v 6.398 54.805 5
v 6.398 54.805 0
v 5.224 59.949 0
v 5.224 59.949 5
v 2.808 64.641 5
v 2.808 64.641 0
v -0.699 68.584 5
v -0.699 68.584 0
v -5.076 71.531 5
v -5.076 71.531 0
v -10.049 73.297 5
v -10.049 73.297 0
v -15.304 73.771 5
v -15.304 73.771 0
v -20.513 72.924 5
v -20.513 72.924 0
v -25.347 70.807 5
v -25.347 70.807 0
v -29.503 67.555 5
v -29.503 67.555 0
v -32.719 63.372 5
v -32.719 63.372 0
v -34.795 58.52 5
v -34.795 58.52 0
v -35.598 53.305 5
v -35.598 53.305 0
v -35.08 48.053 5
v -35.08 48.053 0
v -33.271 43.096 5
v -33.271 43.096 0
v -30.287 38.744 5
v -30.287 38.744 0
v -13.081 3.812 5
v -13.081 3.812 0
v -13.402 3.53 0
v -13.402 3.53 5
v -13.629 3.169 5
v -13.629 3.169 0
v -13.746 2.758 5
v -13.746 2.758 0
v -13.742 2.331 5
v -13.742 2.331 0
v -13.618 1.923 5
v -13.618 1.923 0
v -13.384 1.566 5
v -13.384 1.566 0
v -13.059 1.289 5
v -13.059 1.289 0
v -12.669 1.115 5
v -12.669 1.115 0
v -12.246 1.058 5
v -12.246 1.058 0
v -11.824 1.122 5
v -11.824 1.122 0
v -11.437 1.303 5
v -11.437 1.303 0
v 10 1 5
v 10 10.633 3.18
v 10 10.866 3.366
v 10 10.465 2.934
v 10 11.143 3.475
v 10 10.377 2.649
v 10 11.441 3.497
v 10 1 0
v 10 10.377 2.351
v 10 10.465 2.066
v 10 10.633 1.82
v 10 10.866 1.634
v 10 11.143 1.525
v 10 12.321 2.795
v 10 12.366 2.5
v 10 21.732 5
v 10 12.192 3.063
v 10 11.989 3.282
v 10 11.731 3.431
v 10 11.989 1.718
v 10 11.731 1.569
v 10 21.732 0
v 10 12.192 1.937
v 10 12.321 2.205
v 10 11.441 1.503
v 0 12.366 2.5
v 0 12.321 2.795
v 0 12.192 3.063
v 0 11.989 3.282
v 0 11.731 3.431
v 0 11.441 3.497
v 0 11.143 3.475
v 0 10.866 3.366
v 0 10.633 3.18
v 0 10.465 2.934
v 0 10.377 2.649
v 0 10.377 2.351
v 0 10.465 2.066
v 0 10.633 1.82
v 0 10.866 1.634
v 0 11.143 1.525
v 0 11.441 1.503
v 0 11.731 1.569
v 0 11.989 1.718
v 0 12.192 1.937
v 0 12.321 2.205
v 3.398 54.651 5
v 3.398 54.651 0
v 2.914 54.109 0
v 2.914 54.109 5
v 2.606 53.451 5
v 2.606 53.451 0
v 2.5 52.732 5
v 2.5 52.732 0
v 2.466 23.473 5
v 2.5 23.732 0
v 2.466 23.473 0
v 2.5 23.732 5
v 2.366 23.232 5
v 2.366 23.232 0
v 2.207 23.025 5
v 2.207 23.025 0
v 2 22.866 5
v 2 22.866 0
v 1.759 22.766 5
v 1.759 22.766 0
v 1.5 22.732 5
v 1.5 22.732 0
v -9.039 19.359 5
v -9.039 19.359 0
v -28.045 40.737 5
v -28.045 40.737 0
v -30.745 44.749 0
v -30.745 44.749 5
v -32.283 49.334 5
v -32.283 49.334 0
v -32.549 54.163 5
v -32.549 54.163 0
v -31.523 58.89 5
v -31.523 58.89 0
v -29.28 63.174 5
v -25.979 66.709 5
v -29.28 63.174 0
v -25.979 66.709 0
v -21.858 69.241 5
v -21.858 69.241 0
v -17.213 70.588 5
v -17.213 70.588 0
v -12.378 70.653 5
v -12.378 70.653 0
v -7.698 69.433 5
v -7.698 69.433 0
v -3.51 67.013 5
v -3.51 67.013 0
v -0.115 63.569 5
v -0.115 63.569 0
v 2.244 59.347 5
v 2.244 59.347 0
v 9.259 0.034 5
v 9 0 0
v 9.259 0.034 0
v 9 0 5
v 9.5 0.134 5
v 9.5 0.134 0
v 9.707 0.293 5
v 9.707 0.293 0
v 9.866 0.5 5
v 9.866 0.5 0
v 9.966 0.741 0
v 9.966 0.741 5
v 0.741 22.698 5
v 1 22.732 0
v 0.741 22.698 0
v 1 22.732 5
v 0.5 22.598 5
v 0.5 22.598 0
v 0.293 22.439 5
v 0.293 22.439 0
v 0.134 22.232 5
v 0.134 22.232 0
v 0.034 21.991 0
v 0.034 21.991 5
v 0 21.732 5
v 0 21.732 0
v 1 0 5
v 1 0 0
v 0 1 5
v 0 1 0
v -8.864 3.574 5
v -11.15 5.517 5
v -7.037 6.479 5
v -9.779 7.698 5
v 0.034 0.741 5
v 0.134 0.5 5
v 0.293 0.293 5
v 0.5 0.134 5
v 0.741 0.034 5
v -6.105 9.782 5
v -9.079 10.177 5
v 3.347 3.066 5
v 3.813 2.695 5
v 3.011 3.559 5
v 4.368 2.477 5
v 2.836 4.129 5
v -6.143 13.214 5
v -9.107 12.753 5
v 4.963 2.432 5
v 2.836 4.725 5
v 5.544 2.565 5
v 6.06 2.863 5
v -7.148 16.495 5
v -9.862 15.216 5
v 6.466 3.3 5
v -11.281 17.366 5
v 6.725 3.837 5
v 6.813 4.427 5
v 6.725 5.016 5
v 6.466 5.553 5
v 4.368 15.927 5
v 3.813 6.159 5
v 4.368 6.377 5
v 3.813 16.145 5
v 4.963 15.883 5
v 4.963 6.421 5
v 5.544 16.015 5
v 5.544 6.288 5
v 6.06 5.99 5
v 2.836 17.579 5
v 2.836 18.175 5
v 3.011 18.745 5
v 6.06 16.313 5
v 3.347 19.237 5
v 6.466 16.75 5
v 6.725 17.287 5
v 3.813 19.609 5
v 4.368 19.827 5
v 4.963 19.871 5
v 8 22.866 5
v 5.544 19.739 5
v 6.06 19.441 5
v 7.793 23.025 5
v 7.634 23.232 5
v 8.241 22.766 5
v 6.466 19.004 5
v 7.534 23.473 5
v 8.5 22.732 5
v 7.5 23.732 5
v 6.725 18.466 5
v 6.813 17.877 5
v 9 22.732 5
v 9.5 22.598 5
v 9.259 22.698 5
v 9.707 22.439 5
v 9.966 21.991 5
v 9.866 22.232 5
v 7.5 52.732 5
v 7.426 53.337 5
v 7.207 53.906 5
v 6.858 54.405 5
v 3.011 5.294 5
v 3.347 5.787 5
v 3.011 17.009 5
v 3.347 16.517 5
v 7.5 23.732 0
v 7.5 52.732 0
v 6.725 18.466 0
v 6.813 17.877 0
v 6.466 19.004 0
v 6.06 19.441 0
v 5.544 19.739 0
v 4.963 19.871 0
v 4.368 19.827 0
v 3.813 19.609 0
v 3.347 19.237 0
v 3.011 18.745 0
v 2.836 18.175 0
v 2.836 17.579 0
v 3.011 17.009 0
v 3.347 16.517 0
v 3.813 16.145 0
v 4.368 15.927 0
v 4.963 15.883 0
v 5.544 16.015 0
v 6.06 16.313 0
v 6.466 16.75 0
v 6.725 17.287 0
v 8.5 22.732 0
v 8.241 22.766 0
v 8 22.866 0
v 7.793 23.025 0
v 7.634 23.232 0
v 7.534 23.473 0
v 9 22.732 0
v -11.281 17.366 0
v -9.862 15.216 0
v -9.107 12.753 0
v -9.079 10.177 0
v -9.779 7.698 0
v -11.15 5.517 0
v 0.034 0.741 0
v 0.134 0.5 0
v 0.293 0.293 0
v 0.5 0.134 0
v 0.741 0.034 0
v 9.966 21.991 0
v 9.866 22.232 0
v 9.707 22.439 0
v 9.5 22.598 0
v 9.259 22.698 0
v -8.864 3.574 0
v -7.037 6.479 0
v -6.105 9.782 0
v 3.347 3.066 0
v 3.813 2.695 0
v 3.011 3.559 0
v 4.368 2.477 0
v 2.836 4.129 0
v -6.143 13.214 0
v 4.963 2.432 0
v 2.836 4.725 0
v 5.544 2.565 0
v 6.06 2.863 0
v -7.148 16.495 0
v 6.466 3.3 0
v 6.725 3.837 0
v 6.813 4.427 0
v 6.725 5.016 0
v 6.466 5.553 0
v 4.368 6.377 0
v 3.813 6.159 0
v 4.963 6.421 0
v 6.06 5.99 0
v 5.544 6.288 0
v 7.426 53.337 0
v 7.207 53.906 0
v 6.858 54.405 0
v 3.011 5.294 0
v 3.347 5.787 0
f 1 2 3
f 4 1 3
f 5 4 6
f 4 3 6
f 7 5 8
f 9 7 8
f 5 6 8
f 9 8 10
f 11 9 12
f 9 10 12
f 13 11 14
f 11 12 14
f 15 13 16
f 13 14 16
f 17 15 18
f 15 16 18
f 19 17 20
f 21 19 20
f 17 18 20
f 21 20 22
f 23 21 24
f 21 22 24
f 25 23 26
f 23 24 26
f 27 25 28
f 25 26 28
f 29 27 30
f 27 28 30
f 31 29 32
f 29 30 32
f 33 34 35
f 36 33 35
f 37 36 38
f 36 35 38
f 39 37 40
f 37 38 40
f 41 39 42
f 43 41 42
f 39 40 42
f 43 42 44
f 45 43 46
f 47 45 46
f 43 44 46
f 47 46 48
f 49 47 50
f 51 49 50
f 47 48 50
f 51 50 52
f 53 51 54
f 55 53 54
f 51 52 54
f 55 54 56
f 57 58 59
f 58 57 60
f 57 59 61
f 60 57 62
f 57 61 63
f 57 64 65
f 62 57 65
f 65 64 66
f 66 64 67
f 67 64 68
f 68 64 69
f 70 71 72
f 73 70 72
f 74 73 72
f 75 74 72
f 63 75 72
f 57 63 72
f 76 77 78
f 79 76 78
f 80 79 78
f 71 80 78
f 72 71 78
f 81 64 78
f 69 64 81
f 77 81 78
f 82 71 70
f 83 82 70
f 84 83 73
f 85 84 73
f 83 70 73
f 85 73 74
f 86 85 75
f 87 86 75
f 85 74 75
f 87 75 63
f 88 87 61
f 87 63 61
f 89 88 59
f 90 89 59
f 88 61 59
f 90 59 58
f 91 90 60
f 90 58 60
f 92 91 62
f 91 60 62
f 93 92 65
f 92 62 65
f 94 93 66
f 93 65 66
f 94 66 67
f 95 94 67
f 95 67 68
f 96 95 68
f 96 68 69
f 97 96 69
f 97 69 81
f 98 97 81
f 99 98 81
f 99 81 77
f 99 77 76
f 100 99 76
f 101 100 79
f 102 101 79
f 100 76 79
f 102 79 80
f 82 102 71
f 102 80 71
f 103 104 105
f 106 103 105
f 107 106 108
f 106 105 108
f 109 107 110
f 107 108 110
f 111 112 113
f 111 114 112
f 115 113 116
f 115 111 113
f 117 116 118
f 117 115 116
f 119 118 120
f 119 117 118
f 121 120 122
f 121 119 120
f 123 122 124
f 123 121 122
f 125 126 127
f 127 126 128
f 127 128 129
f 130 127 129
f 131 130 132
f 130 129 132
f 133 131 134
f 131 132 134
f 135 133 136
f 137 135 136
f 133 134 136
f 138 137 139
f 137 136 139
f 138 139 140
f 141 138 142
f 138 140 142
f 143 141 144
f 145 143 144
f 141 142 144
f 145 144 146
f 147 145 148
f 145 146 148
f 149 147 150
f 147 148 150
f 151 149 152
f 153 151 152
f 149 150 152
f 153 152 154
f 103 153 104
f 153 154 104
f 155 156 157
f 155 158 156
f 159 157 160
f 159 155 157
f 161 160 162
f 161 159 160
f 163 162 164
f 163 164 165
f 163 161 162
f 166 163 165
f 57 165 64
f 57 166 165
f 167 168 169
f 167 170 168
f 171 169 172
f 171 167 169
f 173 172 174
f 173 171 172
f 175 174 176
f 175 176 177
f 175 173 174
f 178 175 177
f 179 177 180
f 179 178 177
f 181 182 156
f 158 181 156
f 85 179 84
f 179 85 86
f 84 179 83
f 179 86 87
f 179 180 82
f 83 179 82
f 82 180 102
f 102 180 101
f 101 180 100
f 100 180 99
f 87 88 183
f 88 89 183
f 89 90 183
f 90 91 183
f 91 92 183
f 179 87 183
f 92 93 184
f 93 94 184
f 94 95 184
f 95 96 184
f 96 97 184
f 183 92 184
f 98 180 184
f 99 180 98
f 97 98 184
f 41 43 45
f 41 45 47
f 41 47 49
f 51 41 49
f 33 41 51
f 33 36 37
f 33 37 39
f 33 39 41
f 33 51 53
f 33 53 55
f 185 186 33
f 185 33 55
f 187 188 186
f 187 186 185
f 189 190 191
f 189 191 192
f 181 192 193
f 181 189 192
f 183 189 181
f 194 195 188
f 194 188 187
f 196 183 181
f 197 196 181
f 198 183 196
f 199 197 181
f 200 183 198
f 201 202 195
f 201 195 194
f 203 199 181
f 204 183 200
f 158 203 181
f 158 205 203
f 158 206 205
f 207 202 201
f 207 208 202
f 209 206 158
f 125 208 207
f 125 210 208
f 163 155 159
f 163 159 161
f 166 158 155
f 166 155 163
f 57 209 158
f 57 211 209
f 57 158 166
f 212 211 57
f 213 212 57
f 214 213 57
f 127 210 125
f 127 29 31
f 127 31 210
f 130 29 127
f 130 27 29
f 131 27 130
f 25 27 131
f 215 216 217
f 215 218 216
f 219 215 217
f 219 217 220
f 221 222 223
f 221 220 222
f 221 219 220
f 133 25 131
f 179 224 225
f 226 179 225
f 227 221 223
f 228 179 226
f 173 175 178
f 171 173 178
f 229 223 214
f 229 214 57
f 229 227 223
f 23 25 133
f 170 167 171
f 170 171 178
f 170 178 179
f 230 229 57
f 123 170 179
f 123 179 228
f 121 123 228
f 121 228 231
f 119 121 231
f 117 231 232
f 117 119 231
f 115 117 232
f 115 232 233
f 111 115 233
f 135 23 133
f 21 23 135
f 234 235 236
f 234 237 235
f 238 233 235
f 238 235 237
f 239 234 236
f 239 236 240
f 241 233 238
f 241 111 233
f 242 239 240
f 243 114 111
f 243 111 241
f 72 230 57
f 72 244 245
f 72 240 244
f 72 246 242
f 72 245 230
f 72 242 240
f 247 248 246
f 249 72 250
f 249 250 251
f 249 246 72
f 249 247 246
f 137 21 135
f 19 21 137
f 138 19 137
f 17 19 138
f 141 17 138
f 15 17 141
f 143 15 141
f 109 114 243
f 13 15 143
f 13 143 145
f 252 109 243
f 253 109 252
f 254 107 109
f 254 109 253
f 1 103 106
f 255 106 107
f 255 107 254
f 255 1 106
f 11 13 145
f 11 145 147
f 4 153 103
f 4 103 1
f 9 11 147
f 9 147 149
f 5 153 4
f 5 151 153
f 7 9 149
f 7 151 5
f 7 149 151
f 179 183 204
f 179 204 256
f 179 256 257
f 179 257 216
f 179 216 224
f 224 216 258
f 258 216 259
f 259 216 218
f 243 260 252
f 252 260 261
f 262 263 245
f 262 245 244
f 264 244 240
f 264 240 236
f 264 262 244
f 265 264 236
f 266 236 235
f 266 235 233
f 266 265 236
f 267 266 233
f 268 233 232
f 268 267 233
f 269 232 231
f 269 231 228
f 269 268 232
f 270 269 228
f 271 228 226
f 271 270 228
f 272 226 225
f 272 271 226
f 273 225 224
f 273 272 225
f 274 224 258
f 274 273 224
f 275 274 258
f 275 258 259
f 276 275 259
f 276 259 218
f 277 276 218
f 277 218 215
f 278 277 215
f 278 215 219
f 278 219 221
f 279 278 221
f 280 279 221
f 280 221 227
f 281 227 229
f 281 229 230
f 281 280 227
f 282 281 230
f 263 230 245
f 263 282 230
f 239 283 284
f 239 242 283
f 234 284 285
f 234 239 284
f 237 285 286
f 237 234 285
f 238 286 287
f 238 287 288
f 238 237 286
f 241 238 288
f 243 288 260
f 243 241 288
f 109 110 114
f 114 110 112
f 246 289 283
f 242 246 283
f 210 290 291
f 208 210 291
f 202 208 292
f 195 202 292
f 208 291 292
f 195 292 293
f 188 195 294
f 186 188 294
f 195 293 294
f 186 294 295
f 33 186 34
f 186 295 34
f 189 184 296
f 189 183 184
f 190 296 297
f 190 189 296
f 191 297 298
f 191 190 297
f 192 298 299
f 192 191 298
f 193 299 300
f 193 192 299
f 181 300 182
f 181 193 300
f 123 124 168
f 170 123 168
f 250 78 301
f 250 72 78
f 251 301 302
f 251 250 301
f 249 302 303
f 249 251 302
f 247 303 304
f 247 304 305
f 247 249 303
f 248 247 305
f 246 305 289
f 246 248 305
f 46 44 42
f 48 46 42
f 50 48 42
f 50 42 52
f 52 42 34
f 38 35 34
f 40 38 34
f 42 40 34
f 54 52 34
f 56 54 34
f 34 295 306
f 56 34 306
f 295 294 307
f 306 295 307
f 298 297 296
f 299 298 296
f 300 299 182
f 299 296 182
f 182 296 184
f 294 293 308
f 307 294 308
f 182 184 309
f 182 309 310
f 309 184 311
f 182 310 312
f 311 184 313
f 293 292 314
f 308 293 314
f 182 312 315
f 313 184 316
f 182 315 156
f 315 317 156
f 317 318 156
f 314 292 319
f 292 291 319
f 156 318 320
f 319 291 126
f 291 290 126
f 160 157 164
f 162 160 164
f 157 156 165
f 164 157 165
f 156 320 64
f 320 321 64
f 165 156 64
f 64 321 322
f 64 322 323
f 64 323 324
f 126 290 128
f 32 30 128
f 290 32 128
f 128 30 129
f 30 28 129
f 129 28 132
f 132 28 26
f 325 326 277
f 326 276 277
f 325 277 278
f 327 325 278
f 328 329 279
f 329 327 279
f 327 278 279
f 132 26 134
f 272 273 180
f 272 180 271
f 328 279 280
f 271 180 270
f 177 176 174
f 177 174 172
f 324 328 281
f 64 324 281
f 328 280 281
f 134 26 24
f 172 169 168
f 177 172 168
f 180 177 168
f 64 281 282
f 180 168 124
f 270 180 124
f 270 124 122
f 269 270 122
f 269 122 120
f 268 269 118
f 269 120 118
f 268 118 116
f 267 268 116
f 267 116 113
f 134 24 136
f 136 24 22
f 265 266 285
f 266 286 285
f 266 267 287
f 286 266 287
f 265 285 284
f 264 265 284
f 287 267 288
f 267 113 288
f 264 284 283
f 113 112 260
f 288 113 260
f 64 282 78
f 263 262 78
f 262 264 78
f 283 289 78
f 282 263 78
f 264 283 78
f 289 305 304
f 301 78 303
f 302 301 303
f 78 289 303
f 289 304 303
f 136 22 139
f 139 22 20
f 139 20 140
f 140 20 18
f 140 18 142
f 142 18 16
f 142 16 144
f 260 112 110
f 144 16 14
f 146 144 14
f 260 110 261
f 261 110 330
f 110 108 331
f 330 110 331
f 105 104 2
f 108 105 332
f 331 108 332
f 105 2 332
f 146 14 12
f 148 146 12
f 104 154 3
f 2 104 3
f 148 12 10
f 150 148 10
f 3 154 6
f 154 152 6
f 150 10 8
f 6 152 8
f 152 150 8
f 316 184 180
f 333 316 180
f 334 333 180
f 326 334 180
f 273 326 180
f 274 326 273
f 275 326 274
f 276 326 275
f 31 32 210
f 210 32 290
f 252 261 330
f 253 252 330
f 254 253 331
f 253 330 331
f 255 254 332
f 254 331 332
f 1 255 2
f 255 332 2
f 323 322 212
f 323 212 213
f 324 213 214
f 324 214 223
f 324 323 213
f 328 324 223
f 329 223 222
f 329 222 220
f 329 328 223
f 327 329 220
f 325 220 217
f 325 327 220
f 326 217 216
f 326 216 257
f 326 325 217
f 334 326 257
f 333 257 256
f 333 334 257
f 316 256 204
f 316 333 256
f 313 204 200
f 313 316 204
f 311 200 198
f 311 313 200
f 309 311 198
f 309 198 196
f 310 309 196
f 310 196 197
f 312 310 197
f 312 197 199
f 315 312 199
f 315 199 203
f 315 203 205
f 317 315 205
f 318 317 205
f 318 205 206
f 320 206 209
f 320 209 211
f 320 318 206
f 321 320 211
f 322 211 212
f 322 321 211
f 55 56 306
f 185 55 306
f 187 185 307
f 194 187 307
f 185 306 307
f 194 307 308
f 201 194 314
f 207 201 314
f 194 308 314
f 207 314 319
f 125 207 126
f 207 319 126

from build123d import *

# Parameters (mm, degrees)
F0_R     = 2
F1_DEPTH = 5
F2_R     = 1
F3_R     = 1
F4_DEPTH = 10


with BuildPart() as f1:
    # F0 (on Top) → F1 (new body)
    with BuildSketch(Plane.XY):
        Polygon((0, 22.7317288518), (0, 0), (10, 0), (10, 22.7317288518), (7.5, 22.7317288518), (5, 22.7317288518), (2.5, 22.7317288518), align=None)
        with Locations((4.8133912496, 4.4267121702)):
            Circle(F0_R, mode=Mode.SUBTRACT)
        with Locations((4.8133912496, 17.8769808263)):
            Circle(F0_R, mode=Mode.SUBTRACT)
        with BuildLine():
            Line((2.5, 52.7317288518), (2.5, 22.7317288518))
            Line((2.5, 22.7317288518), (5, 22.7317288518))
            Line((5, 22.7317288518), (5, 51.2317288518))
            ThreePointArc((5, 51.2317288518), (3.9393398282, 51.67106868), (3.5, 52.7317288518))
            ThreePointArc((3.5, 52.7317288518), (3.4744103207, 53.6926062484), (3.3977138284, 54.6507596031))
            ThreePointArc((3.3977138284, 54.6507596031), (2.7355226399, 53.7910410275), (2.5, 52.7317288518))
        make_face()
        with BuildLine():
            Line((5, 22.7317288518), (7.5, 22.7317288518))
            Line((7.5, 22.7317288518), (7.5, 52.7317288518))
            ThreePointArc((7.5, 52.7317288518), (7.2072929768, 53.9055506928), (6.3977138284, 54.8045038164))
            ThreePointArc((6.3977138284, 54.8045038164), (6.4744129083, 53.7693774574), (6.5, 52.7317288518))
            ThreePointArc((6.5, 52.7317288518), (6.0606601718, 51.67106868), (5, 51.2317288518))
            Line((5, 51.2317288518), (5, 22.7317288518))
        make_face()
        with BuildLine():
            ThreePointArc((3.5, 52.7317288518), (3.9393398282, 51.67106868), (5, 51.2317288518))
            Line((5, 51.2317288518), (5, 52.7317288518))
            ThreePointArc((5, 52.7317288518), (4.960003557, 53.9817288518), (4.8401778569, 55.226614998))
            ThreePointArc((4.8401778569, 55.226614998), (4.073091813, 55.053547366), (3.3977138284, 54.6507596031))
            ThreePointArc((3.3977138284, 54.6507596031), (3.4744103207, 53.6926062484), (3.5, 52.7317288518))
        make_face()
        with BuildLine():
            Line((5, 52.7317288518), (5, 51.2317288518))
            ThreePointArc((5, 51.2317288518), (6.0606601718, 51.67106868), (6.5, 52.7317288518))
            ThreePointArc((6.5, 52.7317288518), (6.4744129083, 53.7693774574), (6.3977138284, 54.8045038164))
            ThreePointArc((6.3977138284, 54.8045038164), (5.6539406843, 55.144685872), (4.8401778569, 55.226614998))
            ThreePointArc((4.8401778569, 55.226614998), (4.960003557, 53.9817288518), (5, 52.7317288518))
        make_face()
        with BuildLine():
            ThreePointArc((-28.0449956093, 40.7368995467), (-21.8583839955, 69.2405574995), (3.3977138284, 54.6507596031))
            ThreePointArc((3.3977138284, 54.6507596031), (4.073091813, 55.053547366), (4.8401778569, 55.226614998))
            ThreePointArc((4.8401778569, 55.226614998), (-21.968116408, 70.8241322208), (-30.1189319968, 40.8987017286))
            ThreePointArc((-30.1189319968, 40.8987017286), (-29.0493590182, 41.2357199074), (-28.0449956093, 40.7368995467))
        make_face()
        with BuildLine():
            ThreePointArc((4.8401778569, 55.226614998), (5.6539406843, 55.144685872), (6.3977138284, 54.8045038164))
            ThreePointArc((6.3977138284, 54.8045038164), (-22.9963973106, 72.0173965367), (-30.2870642065, 38.7436287659))
            ThreePointArc((-30.2870642065, 38.7436287659), (-30.661485659, 39.856935046), (-30.1189319968, 40.8987017286))
            ThreePointArc((-30.1189319968, 40.8987017286), (-21.968116408, 70.8241322208), (4.8401778569, 55.226614998))
        make_face()
        with BuildLine():
            Line((-9.0393445759, 19.3589845332), (-28.0449956093, 40.7368995467))
            ThreePointArc((-28.0449956093, 40.7368995467), (-27.6686113105, 39.6523008448), (-28.1693945175, 38.6192298577))
            Line((-28.1693945175, 38.6192298577), (-11.1570142649, 19.4833834414))
            ThreePointArc((-11.1570142649, 19.4833834414), (-10.0724155629, 19.8597677402), (-9.0393445759, 19.3589845332))
        make_face()
        with BuildLine():
            ThreePointArc((-28.1693945175, 38.6192298577), (-27.6686113105, 39.6523008448), (-28.0449956093, 40.7368995467))
            ThreePointArc((-28.0449956093, 40.7368995467), (-29.0493590182, 41.2357199074), (-30.1189319968, 40.8987017286))
            ThreePointArc((-30.1189319968, 40.8987017286), (-29.6535936799, 40.3103418877), (-29.1660299079, 39.7402641563))
            Line((-29.1660299079, 39.7402641563), (-28.1693945175, 38.6192298577))
        make_face()
        with BuildLine():
            ThreePointArc((-30.1189319968, 40.8987017286), (-30.661485659, 39.856935046), (-30.2870642065, 38.7436287659))
            ThreePointArc((-30.2870642065, 38.7436287659), (-29.2539932195, 38.2428455589), (-28.1693945175, 38.6192298577))
            Line((-28.1693945175, 38.6192298577), (-29.1660299079, 39.7402641563))
            ThreePointArc((-29.1660299079, 39.7402641563), (-29.6535936799, 40.3103418877), (-30.1189319968, 40.8987017286))
        make_face()
        with BuildLine():
            ThreePointArc((-28.1693945175, 38.6192298577), (-29.2539932195, 38.2428455589), (-30.2870642065, 38.7436287659))
            Line((-30.2870642065, 38.7436287659), (-11.2814131731, 17.3657137524))
            ThreePointArc((-11.2814131731, 17.3657137524), (-11.6577974719, 18.4503124544), (-11.1570142649, 19.4833834414))
            Line((-11.1570142649, 19.4833834414), (-28.1693945175, 38.6192298577))
        make_face()
        with BuildLine():
            ThreePointArc((-11.4373132839, 1.3031069234), (-6.1047109197, 9.7820673373), (-9.0393445759, 19.3589845332))
            ThreePointArc((-9.0393445759, 19.3589845332), (-8.6670458513, 18.2210817301), (-9.2461191516, 17.1731775156))
            ThreePointArc((-9.2461191516, 17.1731775156), (-10.3016462873, 16.8690161197), (-11.2814131731, 17.3657137524))
            ThreePointArc((-11.2814131731, 17.3657137524), (-9.0785988115, 10.1770240522), (-13.0813924983, 3.8124900222))
            ThreePointArc((-13.0813924983, 3.8124900222), (-13.5140444405, 1.7357588655), (-11.4373132839, 1.3031069234))
        make_face()
        with BuildLine():
            ThreePointArc((-9.2461191516, 17.1731775156), (-8.6670458513, 18.2210817301), (-9.0393445759, 19.3589845332))
            ThreePointArc((-9.0393445759, 19.3589845332), (-10.0724155629, 19.8597677402), (-11.1570142649, 19.4833834414))
            Line((-11.1570142649, 19.4833834414), (-10.1603788745, 18.3623491428))
            ThreePointArc((-10.1603788745, 18.3623491428), (-9.6820476982, 17.7840633382), (-9.2461191516, 17.1731775156))
        make_face()
        with BuildLine():
            ThreePointArc((-11.1570142649, 19.4833834414), (-11.6577974719, 18.4503124544), (-11.2814131731, 17.3657137524))
            ThreePointArc((-11.2814131731, 17.3657137524), (-10.3016462873, 16.8690161197), (-9.2461191516, 17.1731775156))
            ThreePointArc((-9.2461191516, 17.1731775156), (-9.6820476982, 17.7840633382), (-10.1603788745, 18.3623491428))
            Line((-10.1603788745, 18.3623491428), (-11.1570142649, 19.4833834414))
        make_face()
    extrude(amount=F1_DEPTH)

    # F2
    f2_edges = [f1.edges().sort_by_distance(p)[0] for p in [
        (0, 22.731729, 2.5),
        (2.5, 22.731729, 2.5),
        (10, 22.731729, 2.5),
        (7.5, 22.731729, 2.5),
        (10, 0, 2.5),
        (0, 0, 2.5),
    ]]
    fillet(f2_edges, radius=F2_R)

    # F3 (on face) → F4 (cut, through all)
    with BuildSketch(Plane.YZ.offset(10)):
        with Locations((11.3658644259, 2.5)):
            Circle(F3_R)
    extrude(amount=-F4_DEPTH, mode=Mode.SUBTRACT)


solid = f1.part
